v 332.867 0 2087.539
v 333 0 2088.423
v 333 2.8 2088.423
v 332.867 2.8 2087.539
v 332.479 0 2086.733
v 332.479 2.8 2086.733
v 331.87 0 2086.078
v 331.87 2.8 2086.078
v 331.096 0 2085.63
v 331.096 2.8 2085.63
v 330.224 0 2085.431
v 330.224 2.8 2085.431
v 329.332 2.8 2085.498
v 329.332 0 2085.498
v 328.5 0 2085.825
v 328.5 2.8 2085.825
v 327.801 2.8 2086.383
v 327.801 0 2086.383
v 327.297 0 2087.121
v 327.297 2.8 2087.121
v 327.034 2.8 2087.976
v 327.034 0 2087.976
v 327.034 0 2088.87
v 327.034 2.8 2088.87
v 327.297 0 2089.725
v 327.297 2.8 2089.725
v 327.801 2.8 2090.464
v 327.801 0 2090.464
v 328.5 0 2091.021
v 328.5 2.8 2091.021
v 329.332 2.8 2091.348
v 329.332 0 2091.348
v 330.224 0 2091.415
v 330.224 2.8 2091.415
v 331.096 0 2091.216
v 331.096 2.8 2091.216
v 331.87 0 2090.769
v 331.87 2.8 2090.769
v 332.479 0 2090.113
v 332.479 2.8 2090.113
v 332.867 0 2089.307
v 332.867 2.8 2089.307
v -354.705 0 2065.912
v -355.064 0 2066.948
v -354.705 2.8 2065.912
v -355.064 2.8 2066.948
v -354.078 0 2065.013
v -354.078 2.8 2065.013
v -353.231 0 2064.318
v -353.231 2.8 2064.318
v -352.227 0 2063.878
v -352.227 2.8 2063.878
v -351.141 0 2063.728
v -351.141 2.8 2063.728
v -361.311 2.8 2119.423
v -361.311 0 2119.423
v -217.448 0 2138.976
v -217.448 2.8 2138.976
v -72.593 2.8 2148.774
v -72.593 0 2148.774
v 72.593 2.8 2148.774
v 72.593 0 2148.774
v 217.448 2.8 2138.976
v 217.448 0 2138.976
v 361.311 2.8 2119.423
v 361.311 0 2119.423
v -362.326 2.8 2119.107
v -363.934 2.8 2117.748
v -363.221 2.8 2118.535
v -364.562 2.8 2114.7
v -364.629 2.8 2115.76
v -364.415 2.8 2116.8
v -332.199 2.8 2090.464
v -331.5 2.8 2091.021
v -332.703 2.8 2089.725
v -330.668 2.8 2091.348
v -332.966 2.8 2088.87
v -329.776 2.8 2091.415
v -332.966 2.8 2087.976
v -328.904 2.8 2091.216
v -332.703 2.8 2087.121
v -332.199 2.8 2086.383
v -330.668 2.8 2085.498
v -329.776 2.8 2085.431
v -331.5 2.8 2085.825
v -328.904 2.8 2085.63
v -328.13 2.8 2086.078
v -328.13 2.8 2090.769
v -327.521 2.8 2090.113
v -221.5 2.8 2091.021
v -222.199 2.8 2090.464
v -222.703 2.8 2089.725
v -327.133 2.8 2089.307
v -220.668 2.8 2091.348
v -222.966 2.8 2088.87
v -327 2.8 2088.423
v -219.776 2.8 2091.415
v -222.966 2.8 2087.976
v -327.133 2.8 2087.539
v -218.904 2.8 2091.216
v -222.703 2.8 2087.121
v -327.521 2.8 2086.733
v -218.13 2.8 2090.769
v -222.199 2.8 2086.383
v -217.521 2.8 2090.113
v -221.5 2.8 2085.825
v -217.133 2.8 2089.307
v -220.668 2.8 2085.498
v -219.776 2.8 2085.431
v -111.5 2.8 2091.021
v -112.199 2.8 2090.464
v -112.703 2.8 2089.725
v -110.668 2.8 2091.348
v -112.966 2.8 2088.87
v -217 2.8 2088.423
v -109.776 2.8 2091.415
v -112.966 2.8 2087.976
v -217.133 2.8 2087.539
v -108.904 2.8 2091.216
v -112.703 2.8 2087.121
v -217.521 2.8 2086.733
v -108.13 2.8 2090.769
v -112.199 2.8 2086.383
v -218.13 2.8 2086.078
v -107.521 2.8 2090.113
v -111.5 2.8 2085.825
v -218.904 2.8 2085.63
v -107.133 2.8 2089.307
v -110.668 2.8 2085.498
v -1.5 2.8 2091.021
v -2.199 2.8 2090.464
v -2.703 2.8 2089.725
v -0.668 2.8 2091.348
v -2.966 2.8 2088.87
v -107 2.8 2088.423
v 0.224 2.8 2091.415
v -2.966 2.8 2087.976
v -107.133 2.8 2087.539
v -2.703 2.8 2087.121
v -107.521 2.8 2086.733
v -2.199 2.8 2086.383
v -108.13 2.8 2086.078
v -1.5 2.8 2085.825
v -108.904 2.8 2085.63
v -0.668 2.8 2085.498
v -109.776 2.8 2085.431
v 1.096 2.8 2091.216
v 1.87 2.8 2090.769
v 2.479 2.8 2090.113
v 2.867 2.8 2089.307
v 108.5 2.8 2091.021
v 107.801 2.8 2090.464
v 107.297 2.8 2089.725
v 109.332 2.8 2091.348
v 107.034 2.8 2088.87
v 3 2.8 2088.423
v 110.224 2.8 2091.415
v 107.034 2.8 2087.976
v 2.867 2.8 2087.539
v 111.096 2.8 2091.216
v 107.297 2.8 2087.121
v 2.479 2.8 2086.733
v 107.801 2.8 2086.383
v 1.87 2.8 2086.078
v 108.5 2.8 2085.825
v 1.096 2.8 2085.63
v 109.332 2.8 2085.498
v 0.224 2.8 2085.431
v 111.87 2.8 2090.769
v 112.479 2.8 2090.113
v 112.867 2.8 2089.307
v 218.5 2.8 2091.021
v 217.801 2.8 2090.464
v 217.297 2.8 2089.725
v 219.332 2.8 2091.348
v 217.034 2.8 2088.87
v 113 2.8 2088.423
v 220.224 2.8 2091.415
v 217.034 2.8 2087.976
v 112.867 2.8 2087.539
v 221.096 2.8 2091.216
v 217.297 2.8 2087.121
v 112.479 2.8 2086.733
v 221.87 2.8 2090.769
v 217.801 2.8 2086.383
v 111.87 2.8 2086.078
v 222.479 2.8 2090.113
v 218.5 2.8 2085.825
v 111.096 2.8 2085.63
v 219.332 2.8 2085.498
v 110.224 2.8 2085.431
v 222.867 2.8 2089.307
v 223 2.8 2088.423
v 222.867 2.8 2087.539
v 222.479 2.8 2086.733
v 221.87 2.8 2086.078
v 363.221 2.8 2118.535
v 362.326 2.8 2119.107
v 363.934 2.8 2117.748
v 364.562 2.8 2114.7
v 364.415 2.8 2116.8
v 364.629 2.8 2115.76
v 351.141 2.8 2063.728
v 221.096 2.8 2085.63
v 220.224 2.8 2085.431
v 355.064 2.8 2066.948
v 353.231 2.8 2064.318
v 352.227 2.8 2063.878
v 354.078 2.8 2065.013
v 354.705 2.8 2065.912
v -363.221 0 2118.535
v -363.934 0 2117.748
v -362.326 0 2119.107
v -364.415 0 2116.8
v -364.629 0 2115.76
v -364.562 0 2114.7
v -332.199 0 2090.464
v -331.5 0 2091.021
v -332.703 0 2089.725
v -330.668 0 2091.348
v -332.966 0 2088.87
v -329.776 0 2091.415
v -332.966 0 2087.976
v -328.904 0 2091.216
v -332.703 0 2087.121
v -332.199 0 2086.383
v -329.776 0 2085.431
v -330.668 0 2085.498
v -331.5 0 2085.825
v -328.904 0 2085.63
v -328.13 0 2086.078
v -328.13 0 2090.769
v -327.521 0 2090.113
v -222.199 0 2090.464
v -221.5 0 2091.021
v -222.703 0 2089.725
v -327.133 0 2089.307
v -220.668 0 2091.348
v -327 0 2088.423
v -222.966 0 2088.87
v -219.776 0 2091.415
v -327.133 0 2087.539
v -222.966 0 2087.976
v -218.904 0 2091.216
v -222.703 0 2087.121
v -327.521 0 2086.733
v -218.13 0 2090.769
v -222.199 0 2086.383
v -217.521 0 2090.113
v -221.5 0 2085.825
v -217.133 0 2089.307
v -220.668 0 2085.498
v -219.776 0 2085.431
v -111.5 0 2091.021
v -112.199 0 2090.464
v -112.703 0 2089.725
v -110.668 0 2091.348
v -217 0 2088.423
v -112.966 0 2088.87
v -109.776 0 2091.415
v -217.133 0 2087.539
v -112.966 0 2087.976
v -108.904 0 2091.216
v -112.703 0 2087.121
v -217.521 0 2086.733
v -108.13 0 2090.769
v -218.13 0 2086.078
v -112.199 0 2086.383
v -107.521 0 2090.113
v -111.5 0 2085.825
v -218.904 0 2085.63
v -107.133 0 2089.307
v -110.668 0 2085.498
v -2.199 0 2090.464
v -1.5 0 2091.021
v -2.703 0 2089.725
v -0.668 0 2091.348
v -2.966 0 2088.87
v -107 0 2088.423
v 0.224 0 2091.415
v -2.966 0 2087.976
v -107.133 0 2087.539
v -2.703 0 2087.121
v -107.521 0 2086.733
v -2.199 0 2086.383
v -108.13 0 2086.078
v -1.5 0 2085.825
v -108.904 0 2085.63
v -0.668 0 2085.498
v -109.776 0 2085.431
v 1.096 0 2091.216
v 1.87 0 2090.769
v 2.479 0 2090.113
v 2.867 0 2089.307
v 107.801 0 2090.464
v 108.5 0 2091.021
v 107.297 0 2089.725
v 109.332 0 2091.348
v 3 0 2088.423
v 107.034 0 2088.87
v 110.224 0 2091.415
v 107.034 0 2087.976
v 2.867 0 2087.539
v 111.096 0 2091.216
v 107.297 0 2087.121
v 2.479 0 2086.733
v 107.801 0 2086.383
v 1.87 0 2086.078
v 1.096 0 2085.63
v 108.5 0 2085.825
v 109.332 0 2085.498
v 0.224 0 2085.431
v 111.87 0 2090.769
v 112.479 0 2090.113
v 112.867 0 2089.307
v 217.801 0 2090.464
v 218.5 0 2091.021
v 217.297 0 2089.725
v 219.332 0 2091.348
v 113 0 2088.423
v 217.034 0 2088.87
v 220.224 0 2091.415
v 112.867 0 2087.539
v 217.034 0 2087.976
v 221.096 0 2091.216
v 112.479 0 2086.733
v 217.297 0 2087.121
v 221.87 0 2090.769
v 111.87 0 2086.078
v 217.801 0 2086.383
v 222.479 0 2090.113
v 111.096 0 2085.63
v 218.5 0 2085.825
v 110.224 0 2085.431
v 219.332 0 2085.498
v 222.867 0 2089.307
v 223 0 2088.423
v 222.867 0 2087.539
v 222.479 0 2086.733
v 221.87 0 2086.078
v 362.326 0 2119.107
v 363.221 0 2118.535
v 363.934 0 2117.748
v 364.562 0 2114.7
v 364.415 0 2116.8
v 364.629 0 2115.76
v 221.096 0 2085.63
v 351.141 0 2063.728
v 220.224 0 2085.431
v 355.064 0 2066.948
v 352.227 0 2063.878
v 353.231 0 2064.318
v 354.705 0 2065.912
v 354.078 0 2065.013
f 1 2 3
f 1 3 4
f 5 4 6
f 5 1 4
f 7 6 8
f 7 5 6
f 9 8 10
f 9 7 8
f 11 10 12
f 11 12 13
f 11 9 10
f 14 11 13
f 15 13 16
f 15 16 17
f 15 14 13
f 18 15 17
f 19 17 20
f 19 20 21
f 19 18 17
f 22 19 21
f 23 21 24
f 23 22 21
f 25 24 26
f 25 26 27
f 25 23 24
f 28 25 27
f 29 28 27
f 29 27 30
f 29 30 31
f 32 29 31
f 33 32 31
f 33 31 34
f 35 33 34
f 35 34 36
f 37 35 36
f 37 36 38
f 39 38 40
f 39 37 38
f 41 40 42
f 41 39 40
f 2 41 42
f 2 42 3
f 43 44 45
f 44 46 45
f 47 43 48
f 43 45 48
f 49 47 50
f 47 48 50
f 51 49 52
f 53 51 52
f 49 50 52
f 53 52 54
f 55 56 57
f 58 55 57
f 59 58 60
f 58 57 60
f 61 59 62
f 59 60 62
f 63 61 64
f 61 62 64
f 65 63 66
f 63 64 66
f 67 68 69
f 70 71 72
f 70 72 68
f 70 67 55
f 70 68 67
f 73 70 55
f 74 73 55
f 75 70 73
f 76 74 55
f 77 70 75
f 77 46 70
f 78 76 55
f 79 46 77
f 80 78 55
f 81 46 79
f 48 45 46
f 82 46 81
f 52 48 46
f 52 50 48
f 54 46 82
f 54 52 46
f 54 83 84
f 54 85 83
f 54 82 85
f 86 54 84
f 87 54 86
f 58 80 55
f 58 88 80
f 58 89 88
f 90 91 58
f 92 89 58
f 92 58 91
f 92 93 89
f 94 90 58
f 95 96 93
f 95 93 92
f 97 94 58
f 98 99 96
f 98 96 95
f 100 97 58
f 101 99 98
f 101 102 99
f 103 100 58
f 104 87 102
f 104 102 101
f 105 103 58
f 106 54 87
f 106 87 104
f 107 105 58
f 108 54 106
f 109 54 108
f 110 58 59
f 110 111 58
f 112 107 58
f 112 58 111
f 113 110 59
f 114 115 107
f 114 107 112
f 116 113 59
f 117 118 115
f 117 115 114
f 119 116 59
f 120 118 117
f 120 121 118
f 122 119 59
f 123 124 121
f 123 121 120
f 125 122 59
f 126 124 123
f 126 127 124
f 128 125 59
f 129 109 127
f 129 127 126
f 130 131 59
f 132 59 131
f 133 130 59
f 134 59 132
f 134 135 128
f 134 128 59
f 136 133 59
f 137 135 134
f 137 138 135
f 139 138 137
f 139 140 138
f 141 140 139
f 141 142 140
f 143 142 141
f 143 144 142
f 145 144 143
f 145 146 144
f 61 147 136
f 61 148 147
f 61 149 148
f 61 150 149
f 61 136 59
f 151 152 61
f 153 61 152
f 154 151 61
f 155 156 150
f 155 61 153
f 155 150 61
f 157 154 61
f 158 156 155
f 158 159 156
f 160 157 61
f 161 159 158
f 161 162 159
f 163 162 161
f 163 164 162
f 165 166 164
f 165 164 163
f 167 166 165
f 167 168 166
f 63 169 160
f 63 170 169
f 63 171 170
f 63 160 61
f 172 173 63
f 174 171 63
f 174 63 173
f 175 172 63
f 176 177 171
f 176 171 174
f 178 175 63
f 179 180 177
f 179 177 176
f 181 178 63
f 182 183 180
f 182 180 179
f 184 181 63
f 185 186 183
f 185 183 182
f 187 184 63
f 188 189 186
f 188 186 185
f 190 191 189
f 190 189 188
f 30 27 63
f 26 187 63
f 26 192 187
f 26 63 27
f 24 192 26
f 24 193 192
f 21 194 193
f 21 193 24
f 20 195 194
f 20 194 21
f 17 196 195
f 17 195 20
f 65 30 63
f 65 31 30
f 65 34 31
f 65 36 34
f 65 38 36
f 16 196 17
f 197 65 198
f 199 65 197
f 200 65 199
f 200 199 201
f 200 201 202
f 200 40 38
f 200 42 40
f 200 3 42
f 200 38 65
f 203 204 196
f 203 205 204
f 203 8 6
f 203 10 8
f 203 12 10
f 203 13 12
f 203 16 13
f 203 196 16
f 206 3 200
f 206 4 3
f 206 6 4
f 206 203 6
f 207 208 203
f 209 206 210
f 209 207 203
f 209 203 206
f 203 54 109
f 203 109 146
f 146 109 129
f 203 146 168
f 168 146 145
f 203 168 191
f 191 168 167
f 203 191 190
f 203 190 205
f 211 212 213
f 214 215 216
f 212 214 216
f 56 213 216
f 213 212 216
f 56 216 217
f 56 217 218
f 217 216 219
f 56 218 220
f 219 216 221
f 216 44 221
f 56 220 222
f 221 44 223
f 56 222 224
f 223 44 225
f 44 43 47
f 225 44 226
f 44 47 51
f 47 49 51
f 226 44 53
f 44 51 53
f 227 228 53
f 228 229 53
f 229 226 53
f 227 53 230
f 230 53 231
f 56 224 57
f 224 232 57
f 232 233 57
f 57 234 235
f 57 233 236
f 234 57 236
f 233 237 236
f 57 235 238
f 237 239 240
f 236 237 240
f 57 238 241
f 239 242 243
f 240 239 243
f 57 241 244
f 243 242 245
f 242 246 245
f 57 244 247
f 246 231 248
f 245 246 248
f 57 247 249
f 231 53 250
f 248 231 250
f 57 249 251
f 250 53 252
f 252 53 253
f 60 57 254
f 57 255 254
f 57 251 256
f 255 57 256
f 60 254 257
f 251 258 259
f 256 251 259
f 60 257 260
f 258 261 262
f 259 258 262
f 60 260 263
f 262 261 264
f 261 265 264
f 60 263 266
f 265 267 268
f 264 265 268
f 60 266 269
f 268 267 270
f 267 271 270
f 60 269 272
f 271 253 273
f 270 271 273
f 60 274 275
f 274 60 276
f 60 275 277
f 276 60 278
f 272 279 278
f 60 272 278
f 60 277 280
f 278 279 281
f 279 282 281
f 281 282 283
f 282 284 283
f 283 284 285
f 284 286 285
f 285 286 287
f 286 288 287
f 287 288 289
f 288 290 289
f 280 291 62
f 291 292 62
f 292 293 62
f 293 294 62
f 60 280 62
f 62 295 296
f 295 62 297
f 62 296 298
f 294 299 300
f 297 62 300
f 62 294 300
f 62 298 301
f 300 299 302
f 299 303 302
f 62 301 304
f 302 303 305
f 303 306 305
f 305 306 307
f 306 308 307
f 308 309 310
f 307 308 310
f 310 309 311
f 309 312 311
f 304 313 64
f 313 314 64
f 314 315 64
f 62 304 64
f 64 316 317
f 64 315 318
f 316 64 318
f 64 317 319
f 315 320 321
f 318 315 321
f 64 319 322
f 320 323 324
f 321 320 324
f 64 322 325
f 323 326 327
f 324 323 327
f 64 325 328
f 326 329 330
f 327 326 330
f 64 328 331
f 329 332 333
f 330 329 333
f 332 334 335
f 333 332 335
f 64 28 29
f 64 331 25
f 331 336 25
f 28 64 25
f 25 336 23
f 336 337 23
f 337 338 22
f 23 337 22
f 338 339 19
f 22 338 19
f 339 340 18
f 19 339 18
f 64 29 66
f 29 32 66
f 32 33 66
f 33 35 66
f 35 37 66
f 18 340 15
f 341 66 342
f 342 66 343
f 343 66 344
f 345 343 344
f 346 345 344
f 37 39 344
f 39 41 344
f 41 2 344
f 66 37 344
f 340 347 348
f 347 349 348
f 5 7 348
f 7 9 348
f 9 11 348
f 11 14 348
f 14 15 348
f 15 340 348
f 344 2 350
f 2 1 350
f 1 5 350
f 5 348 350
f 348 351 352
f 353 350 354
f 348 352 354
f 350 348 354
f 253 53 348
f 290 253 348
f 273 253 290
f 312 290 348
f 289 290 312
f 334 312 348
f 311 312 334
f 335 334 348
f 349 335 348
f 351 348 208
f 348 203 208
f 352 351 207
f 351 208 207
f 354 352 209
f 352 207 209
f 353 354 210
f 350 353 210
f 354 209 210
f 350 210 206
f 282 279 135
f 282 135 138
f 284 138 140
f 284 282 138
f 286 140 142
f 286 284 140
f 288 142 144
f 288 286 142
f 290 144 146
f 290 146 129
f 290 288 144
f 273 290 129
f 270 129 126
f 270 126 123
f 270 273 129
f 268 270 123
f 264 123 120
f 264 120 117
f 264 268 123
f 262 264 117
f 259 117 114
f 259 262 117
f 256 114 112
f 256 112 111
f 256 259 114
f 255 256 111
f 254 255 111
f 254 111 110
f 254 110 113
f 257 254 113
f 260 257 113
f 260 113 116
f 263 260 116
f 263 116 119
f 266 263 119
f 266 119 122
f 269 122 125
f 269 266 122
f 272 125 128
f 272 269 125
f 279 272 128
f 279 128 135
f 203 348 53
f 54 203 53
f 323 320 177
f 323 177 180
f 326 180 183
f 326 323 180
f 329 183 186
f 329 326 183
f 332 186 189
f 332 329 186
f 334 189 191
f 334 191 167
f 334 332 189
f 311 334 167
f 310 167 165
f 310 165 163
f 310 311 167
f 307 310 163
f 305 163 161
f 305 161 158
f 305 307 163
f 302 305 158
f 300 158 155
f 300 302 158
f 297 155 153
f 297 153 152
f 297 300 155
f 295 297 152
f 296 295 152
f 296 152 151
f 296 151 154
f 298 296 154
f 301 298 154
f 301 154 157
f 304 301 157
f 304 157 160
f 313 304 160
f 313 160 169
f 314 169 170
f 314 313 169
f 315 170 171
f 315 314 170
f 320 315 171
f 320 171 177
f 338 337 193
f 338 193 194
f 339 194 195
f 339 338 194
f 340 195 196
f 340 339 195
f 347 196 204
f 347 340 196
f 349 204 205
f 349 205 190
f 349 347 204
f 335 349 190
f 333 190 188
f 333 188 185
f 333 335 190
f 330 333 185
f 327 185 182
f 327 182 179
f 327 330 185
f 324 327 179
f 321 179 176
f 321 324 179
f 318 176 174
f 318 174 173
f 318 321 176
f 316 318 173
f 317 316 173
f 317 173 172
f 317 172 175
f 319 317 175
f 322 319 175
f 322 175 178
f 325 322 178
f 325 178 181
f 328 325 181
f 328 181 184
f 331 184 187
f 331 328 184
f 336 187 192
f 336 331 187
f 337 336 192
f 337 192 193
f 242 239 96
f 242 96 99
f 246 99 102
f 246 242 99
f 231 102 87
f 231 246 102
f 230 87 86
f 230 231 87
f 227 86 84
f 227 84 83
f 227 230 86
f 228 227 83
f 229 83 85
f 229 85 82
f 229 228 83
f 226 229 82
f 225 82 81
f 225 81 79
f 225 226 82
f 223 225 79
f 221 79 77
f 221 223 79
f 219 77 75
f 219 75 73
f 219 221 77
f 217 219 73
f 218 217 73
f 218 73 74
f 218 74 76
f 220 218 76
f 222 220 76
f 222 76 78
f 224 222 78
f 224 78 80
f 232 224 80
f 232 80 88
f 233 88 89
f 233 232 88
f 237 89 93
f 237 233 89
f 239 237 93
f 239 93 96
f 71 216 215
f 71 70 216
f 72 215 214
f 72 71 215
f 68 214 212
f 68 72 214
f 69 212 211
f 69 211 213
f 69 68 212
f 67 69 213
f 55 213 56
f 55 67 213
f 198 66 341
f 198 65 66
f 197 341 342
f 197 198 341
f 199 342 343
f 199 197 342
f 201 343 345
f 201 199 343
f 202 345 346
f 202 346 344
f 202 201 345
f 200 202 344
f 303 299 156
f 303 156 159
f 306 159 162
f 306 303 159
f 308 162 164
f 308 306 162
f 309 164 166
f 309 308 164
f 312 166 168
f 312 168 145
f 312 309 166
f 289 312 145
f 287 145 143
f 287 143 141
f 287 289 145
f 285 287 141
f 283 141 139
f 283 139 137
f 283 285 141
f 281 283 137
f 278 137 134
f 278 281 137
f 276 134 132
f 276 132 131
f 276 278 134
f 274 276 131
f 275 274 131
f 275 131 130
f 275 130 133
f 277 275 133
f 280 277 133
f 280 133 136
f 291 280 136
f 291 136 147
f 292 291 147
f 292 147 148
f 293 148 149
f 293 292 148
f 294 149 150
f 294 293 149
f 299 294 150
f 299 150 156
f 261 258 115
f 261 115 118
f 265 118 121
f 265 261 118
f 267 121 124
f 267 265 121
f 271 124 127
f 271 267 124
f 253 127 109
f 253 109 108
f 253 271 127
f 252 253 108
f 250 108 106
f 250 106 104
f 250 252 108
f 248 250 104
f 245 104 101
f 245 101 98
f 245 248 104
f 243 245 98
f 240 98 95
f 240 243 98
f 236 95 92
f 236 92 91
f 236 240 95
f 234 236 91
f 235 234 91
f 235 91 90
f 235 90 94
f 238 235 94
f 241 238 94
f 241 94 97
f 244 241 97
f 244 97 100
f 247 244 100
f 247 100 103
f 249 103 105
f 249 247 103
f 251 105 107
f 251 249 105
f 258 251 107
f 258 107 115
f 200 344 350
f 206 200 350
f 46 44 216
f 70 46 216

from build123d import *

# Parameters (mm, degrees)
SKETCH1_R           = 3
BOSS_EXTRUDE1_DEPTH = 2.8
FILLET1_R           = 4


with BuildPart() as part:
    # Sketch1 → Boss-Extrude1 (new body)
    with BuildSketch(Plane(origin=(0, 0, 0), x_dir=(1, 0, 0), z_dir=(0, 1, 0))):
        with BuildLine():
            Line((-354.423555473, -2063.72823662), (-365.363735679, -2118.72823662))
            ThreePointArc((-365.363735679, -2118.72823662), (0, -2150), (365.363735679, -2118.72823662))
            Line((365.363735679, -2118.72823662), (354.423555473, -2063.72823662))
            Line((354.423555473, -2063.72823662), (-354.423555473, -2063.72823662))
        make_face()
        with Locations((0, -2088.423050098)):
            Circle(SKETCH1_R, mode=Mode.SUBTRACT)
        with Locations((110, -2088.423050098)):
            Circle(SKETCH1_R, mode=Mode.SUBTRACT)
        with Locations((220, -2088.423050098)):
            Circle(SKETCH1_R, mode=Mode.SUBTRACT)
        with Locations((330, -2088.423050098)):
            Circle(SKETCH1_R, mode=Mode.SUBTRACT)
        with Locations((-110, -2088.423050098)):
            Circle(SKETCH1_R, mode=Mode.SUBTRACT)
        with Locations((-220, -2088.423050098)):
            Circle(SKETCH1_R, mode=Mode.SUBTRACT)
        with Locations((-330, -2088.423050098)):
            Circle(SKETCH1_R, mode=Mode.SUBTRACT)
    extrude(amount=BOSS_EXTRUDE1_DEPTH)

    # Fillet1
    fillet1_edges = [part.edges().sort_by_distance(p)[0] for p in [
        (365.363735679, 1.4, 2118.72823662),
        (-365.363735679, 1.4, 2118.72823662),
        (-354.423555473, 1.4, 2063.72823662),
        (354.423555473, 1.4, 2063.72823662),
    ]]
    fillet(fillet1_edges, radius=FILLET1_R)


solid = part.part
